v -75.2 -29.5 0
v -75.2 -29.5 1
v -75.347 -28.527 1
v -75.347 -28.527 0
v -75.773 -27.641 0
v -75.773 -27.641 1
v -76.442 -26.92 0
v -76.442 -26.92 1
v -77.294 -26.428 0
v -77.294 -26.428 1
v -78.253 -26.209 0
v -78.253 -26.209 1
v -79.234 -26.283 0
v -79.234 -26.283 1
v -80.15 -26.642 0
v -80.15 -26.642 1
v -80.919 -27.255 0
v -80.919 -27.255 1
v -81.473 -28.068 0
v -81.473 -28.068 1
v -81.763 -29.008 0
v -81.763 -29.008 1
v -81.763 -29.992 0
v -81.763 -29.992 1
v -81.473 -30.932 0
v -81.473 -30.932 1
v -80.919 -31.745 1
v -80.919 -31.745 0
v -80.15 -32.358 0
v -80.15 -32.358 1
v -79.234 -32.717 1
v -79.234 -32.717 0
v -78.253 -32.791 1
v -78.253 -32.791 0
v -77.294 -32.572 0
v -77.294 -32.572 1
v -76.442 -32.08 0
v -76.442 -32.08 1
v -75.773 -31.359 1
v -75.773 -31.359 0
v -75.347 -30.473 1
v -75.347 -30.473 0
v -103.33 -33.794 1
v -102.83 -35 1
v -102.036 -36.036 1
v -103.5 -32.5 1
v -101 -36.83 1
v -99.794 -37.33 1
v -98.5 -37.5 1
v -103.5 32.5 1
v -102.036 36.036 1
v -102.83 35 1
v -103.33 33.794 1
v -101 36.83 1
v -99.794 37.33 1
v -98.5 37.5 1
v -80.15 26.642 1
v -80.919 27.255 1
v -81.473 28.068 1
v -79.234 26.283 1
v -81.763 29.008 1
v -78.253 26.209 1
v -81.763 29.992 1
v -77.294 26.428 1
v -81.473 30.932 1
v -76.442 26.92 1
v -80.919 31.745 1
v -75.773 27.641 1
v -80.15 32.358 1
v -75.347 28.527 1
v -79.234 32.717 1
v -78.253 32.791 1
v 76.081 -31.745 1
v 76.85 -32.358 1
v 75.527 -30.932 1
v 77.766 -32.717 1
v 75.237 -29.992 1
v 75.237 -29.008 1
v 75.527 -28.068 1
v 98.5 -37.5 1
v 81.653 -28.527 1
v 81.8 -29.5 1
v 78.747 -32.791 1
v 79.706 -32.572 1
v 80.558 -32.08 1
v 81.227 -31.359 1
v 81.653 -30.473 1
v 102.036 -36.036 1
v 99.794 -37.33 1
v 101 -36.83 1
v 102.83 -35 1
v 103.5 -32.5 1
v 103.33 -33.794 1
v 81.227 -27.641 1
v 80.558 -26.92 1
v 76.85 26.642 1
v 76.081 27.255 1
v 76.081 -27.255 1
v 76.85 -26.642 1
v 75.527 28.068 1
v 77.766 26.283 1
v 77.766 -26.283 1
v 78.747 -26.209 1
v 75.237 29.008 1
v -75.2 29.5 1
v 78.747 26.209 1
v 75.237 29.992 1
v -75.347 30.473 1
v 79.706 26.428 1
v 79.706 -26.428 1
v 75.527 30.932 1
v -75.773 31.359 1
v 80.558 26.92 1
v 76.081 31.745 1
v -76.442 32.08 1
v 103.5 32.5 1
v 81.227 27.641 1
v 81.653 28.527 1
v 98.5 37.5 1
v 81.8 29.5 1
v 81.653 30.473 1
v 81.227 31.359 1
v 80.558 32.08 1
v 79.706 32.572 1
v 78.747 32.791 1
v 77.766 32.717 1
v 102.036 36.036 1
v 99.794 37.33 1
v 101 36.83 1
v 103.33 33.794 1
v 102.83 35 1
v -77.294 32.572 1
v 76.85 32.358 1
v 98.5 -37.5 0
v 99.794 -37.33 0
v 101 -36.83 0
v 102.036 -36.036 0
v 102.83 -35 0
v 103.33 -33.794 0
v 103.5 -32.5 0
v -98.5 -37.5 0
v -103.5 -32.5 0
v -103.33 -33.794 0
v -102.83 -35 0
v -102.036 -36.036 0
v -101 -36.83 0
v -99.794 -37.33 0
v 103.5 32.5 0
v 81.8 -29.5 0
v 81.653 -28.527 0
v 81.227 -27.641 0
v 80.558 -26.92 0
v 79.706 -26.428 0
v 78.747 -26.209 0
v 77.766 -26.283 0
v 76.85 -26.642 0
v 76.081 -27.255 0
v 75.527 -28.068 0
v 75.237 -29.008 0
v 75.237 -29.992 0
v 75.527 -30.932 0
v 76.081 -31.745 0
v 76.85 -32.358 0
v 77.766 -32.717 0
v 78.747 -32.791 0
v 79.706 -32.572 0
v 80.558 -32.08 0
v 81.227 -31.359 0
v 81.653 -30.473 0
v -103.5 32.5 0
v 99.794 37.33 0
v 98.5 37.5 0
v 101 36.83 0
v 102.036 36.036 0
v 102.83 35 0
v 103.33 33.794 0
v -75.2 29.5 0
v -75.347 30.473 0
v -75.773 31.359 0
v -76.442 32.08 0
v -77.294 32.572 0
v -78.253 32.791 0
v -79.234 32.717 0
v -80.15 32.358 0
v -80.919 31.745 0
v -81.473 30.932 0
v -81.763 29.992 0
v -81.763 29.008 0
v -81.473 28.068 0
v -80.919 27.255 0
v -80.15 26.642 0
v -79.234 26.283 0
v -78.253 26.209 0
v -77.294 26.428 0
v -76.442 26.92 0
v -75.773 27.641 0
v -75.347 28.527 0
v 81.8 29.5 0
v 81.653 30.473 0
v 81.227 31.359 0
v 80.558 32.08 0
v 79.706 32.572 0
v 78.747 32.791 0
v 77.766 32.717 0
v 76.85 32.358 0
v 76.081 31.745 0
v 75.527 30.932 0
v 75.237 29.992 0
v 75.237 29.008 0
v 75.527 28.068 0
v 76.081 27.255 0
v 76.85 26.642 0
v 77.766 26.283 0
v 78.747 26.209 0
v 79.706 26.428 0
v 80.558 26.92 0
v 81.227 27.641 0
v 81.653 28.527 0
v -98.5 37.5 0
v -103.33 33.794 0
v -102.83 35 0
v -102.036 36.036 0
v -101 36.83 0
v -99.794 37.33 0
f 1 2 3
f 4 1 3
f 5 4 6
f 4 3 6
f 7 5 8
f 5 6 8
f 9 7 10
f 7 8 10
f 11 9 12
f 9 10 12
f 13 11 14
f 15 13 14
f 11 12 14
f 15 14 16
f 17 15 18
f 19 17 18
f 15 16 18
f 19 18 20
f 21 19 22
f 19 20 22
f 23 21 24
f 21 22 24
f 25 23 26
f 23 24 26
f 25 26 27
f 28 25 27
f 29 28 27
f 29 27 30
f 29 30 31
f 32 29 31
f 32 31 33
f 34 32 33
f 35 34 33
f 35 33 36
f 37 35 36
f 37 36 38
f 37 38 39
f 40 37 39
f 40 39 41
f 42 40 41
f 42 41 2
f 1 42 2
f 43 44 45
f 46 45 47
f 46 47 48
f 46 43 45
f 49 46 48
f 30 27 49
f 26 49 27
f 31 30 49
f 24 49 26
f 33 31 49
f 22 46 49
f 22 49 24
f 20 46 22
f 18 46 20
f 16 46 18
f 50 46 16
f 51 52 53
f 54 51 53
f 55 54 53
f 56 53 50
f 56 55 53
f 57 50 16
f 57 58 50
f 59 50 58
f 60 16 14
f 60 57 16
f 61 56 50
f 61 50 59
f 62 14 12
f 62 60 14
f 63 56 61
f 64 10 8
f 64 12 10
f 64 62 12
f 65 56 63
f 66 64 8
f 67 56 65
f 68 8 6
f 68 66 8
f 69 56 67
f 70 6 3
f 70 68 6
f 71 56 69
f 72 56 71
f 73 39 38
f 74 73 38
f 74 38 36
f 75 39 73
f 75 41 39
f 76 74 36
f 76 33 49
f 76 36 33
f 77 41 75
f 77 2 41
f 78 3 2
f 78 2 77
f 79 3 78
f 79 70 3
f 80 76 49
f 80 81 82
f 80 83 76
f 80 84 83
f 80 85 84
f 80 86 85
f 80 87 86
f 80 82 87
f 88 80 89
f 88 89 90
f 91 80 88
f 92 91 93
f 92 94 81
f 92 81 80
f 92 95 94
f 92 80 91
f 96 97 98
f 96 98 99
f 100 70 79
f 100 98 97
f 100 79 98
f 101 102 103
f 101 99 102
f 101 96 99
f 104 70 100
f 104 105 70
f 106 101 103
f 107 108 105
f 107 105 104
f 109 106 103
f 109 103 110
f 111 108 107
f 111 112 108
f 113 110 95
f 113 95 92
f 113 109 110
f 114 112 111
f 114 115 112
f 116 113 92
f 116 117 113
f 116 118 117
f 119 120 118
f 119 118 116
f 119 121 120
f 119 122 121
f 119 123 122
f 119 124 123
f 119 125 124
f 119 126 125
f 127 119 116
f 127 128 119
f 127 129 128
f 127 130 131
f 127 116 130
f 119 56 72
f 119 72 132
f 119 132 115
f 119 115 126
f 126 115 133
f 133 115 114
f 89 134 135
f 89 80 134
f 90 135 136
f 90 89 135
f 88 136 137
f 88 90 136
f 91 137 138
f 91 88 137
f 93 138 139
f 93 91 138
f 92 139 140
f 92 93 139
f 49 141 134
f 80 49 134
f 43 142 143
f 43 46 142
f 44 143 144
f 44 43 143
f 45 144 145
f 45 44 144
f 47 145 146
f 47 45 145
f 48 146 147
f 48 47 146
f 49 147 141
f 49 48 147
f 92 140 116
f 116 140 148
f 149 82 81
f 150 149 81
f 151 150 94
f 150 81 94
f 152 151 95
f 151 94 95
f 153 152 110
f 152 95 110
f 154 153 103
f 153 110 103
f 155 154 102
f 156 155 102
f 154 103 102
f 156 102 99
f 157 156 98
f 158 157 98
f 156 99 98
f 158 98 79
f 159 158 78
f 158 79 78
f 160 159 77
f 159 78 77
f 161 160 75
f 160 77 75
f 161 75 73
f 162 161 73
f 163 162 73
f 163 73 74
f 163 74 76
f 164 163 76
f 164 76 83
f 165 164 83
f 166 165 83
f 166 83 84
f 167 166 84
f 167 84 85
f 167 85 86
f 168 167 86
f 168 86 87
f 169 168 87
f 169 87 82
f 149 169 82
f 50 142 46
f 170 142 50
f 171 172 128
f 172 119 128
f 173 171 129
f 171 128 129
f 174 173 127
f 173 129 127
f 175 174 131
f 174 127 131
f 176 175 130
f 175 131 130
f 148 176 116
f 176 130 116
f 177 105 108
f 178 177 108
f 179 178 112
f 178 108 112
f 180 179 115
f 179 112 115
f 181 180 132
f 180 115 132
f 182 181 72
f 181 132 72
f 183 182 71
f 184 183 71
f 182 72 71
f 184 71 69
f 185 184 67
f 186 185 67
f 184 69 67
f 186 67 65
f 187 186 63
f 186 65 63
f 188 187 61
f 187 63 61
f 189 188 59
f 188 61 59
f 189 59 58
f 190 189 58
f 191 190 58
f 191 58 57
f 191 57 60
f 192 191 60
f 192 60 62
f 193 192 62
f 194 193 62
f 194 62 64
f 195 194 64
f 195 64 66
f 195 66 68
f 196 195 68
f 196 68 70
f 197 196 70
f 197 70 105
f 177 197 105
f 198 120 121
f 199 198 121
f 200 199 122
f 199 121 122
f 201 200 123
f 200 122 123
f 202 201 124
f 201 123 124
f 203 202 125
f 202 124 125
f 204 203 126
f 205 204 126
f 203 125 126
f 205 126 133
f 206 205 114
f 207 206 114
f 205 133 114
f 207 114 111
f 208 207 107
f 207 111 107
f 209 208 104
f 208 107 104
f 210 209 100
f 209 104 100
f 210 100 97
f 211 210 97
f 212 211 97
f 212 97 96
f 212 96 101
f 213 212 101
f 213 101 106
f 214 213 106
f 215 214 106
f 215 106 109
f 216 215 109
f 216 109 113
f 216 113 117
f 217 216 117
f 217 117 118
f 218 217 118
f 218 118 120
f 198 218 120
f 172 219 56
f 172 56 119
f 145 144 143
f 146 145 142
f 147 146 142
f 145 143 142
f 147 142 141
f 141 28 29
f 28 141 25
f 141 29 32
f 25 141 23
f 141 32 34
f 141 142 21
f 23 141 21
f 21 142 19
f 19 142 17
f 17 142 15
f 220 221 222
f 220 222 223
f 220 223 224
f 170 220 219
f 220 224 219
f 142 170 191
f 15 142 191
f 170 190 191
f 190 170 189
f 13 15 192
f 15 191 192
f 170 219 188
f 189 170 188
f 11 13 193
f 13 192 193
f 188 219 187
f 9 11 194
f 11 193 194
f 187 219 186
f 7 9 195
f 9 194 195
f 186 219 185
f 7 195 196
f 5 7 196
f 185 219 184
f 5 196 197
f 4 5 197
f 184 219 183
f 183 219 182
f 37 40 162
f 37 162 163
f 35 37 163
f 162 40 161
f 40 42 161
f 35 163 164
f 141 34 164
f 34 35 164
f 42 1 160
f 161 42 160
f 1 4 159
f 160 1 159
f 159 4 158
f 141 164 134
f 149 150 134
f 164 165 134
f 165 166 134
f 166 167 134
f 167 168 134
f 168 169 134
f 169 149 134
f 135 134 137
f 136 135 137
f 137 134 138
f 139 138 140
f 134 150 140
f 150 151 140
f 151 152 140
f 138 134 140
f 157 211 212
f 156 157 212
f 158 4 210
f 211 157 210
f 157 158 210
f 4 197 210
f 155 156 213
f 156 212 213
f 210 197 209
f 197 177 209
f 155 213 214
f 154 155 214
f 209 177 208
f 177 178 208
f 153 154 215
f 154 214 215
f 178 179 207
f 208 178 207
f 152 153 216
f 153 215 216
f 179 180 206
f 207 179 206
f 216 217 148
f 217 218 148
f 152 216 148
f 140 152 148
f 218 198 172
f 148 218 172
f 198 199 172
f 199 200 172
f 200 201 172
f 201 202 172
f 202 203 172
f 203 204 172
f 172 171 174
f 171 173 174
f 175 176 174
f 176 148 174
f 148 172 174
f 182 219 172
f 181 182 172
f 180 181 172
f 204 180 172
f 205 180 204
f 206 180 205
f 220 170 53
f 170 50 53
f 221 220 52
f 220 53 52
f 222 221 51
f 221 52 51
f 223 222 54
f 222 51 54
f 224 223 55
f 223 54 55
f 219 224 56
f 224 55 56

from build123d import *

# Parameters (mm, degrees)
SKETCH_1_W          = 207
SKETCH_1_H          = 75
EXTRUDE_1_DEPTH     = 1
SKETCH_2_R          = 3.3
CUT_EXTRUDE_1_DEPTH = 111.088600681
FILLET_1_R          = 5


with BuildPart() as part:
    # 草图1 → 凸台-拉伸1 (new body)
    with BuildSketch(Plane.XY):
        Rectangle(SKETCH_1_W, SKETCH_1_H)
    extrude(amount=EXTRUDE_1_DEPTH)

    # 草图2 → 切除-拉伸1 (cut, through all)
    with BuildSketch(Plane.XY.offset(1)):
        with Locations((-78.5, 29.5)):
            Circle(SKETCH_2_R)
        with Locations((78.5, 29.5)):
            Circle(SKETCH_2_R)
        with Locations((-78.5, -29.5)):
            Circle(SKETCH_2_R)
        with Locations((78.5, -29.5)):
            Circle(SKETCH_2_R)
    extrude(amount=-CUT_EXTRUDE_1_DEPTH, mode=Mode.SUBTRACT)

    # 圆角1
    fillet_1_edges = [part.edges().sort_by_distance(p)[0] for p in [
        (103.5, -37.5, 0.5),
        (-103.5, -37.5, 0.5),
        (-103.5, 37.5, 0.5),
        (103.5, 37.5, 0.5),
    ]]
    fillet(fillet_1_edges, radius=FILLET_1_R)


solid = part.part
